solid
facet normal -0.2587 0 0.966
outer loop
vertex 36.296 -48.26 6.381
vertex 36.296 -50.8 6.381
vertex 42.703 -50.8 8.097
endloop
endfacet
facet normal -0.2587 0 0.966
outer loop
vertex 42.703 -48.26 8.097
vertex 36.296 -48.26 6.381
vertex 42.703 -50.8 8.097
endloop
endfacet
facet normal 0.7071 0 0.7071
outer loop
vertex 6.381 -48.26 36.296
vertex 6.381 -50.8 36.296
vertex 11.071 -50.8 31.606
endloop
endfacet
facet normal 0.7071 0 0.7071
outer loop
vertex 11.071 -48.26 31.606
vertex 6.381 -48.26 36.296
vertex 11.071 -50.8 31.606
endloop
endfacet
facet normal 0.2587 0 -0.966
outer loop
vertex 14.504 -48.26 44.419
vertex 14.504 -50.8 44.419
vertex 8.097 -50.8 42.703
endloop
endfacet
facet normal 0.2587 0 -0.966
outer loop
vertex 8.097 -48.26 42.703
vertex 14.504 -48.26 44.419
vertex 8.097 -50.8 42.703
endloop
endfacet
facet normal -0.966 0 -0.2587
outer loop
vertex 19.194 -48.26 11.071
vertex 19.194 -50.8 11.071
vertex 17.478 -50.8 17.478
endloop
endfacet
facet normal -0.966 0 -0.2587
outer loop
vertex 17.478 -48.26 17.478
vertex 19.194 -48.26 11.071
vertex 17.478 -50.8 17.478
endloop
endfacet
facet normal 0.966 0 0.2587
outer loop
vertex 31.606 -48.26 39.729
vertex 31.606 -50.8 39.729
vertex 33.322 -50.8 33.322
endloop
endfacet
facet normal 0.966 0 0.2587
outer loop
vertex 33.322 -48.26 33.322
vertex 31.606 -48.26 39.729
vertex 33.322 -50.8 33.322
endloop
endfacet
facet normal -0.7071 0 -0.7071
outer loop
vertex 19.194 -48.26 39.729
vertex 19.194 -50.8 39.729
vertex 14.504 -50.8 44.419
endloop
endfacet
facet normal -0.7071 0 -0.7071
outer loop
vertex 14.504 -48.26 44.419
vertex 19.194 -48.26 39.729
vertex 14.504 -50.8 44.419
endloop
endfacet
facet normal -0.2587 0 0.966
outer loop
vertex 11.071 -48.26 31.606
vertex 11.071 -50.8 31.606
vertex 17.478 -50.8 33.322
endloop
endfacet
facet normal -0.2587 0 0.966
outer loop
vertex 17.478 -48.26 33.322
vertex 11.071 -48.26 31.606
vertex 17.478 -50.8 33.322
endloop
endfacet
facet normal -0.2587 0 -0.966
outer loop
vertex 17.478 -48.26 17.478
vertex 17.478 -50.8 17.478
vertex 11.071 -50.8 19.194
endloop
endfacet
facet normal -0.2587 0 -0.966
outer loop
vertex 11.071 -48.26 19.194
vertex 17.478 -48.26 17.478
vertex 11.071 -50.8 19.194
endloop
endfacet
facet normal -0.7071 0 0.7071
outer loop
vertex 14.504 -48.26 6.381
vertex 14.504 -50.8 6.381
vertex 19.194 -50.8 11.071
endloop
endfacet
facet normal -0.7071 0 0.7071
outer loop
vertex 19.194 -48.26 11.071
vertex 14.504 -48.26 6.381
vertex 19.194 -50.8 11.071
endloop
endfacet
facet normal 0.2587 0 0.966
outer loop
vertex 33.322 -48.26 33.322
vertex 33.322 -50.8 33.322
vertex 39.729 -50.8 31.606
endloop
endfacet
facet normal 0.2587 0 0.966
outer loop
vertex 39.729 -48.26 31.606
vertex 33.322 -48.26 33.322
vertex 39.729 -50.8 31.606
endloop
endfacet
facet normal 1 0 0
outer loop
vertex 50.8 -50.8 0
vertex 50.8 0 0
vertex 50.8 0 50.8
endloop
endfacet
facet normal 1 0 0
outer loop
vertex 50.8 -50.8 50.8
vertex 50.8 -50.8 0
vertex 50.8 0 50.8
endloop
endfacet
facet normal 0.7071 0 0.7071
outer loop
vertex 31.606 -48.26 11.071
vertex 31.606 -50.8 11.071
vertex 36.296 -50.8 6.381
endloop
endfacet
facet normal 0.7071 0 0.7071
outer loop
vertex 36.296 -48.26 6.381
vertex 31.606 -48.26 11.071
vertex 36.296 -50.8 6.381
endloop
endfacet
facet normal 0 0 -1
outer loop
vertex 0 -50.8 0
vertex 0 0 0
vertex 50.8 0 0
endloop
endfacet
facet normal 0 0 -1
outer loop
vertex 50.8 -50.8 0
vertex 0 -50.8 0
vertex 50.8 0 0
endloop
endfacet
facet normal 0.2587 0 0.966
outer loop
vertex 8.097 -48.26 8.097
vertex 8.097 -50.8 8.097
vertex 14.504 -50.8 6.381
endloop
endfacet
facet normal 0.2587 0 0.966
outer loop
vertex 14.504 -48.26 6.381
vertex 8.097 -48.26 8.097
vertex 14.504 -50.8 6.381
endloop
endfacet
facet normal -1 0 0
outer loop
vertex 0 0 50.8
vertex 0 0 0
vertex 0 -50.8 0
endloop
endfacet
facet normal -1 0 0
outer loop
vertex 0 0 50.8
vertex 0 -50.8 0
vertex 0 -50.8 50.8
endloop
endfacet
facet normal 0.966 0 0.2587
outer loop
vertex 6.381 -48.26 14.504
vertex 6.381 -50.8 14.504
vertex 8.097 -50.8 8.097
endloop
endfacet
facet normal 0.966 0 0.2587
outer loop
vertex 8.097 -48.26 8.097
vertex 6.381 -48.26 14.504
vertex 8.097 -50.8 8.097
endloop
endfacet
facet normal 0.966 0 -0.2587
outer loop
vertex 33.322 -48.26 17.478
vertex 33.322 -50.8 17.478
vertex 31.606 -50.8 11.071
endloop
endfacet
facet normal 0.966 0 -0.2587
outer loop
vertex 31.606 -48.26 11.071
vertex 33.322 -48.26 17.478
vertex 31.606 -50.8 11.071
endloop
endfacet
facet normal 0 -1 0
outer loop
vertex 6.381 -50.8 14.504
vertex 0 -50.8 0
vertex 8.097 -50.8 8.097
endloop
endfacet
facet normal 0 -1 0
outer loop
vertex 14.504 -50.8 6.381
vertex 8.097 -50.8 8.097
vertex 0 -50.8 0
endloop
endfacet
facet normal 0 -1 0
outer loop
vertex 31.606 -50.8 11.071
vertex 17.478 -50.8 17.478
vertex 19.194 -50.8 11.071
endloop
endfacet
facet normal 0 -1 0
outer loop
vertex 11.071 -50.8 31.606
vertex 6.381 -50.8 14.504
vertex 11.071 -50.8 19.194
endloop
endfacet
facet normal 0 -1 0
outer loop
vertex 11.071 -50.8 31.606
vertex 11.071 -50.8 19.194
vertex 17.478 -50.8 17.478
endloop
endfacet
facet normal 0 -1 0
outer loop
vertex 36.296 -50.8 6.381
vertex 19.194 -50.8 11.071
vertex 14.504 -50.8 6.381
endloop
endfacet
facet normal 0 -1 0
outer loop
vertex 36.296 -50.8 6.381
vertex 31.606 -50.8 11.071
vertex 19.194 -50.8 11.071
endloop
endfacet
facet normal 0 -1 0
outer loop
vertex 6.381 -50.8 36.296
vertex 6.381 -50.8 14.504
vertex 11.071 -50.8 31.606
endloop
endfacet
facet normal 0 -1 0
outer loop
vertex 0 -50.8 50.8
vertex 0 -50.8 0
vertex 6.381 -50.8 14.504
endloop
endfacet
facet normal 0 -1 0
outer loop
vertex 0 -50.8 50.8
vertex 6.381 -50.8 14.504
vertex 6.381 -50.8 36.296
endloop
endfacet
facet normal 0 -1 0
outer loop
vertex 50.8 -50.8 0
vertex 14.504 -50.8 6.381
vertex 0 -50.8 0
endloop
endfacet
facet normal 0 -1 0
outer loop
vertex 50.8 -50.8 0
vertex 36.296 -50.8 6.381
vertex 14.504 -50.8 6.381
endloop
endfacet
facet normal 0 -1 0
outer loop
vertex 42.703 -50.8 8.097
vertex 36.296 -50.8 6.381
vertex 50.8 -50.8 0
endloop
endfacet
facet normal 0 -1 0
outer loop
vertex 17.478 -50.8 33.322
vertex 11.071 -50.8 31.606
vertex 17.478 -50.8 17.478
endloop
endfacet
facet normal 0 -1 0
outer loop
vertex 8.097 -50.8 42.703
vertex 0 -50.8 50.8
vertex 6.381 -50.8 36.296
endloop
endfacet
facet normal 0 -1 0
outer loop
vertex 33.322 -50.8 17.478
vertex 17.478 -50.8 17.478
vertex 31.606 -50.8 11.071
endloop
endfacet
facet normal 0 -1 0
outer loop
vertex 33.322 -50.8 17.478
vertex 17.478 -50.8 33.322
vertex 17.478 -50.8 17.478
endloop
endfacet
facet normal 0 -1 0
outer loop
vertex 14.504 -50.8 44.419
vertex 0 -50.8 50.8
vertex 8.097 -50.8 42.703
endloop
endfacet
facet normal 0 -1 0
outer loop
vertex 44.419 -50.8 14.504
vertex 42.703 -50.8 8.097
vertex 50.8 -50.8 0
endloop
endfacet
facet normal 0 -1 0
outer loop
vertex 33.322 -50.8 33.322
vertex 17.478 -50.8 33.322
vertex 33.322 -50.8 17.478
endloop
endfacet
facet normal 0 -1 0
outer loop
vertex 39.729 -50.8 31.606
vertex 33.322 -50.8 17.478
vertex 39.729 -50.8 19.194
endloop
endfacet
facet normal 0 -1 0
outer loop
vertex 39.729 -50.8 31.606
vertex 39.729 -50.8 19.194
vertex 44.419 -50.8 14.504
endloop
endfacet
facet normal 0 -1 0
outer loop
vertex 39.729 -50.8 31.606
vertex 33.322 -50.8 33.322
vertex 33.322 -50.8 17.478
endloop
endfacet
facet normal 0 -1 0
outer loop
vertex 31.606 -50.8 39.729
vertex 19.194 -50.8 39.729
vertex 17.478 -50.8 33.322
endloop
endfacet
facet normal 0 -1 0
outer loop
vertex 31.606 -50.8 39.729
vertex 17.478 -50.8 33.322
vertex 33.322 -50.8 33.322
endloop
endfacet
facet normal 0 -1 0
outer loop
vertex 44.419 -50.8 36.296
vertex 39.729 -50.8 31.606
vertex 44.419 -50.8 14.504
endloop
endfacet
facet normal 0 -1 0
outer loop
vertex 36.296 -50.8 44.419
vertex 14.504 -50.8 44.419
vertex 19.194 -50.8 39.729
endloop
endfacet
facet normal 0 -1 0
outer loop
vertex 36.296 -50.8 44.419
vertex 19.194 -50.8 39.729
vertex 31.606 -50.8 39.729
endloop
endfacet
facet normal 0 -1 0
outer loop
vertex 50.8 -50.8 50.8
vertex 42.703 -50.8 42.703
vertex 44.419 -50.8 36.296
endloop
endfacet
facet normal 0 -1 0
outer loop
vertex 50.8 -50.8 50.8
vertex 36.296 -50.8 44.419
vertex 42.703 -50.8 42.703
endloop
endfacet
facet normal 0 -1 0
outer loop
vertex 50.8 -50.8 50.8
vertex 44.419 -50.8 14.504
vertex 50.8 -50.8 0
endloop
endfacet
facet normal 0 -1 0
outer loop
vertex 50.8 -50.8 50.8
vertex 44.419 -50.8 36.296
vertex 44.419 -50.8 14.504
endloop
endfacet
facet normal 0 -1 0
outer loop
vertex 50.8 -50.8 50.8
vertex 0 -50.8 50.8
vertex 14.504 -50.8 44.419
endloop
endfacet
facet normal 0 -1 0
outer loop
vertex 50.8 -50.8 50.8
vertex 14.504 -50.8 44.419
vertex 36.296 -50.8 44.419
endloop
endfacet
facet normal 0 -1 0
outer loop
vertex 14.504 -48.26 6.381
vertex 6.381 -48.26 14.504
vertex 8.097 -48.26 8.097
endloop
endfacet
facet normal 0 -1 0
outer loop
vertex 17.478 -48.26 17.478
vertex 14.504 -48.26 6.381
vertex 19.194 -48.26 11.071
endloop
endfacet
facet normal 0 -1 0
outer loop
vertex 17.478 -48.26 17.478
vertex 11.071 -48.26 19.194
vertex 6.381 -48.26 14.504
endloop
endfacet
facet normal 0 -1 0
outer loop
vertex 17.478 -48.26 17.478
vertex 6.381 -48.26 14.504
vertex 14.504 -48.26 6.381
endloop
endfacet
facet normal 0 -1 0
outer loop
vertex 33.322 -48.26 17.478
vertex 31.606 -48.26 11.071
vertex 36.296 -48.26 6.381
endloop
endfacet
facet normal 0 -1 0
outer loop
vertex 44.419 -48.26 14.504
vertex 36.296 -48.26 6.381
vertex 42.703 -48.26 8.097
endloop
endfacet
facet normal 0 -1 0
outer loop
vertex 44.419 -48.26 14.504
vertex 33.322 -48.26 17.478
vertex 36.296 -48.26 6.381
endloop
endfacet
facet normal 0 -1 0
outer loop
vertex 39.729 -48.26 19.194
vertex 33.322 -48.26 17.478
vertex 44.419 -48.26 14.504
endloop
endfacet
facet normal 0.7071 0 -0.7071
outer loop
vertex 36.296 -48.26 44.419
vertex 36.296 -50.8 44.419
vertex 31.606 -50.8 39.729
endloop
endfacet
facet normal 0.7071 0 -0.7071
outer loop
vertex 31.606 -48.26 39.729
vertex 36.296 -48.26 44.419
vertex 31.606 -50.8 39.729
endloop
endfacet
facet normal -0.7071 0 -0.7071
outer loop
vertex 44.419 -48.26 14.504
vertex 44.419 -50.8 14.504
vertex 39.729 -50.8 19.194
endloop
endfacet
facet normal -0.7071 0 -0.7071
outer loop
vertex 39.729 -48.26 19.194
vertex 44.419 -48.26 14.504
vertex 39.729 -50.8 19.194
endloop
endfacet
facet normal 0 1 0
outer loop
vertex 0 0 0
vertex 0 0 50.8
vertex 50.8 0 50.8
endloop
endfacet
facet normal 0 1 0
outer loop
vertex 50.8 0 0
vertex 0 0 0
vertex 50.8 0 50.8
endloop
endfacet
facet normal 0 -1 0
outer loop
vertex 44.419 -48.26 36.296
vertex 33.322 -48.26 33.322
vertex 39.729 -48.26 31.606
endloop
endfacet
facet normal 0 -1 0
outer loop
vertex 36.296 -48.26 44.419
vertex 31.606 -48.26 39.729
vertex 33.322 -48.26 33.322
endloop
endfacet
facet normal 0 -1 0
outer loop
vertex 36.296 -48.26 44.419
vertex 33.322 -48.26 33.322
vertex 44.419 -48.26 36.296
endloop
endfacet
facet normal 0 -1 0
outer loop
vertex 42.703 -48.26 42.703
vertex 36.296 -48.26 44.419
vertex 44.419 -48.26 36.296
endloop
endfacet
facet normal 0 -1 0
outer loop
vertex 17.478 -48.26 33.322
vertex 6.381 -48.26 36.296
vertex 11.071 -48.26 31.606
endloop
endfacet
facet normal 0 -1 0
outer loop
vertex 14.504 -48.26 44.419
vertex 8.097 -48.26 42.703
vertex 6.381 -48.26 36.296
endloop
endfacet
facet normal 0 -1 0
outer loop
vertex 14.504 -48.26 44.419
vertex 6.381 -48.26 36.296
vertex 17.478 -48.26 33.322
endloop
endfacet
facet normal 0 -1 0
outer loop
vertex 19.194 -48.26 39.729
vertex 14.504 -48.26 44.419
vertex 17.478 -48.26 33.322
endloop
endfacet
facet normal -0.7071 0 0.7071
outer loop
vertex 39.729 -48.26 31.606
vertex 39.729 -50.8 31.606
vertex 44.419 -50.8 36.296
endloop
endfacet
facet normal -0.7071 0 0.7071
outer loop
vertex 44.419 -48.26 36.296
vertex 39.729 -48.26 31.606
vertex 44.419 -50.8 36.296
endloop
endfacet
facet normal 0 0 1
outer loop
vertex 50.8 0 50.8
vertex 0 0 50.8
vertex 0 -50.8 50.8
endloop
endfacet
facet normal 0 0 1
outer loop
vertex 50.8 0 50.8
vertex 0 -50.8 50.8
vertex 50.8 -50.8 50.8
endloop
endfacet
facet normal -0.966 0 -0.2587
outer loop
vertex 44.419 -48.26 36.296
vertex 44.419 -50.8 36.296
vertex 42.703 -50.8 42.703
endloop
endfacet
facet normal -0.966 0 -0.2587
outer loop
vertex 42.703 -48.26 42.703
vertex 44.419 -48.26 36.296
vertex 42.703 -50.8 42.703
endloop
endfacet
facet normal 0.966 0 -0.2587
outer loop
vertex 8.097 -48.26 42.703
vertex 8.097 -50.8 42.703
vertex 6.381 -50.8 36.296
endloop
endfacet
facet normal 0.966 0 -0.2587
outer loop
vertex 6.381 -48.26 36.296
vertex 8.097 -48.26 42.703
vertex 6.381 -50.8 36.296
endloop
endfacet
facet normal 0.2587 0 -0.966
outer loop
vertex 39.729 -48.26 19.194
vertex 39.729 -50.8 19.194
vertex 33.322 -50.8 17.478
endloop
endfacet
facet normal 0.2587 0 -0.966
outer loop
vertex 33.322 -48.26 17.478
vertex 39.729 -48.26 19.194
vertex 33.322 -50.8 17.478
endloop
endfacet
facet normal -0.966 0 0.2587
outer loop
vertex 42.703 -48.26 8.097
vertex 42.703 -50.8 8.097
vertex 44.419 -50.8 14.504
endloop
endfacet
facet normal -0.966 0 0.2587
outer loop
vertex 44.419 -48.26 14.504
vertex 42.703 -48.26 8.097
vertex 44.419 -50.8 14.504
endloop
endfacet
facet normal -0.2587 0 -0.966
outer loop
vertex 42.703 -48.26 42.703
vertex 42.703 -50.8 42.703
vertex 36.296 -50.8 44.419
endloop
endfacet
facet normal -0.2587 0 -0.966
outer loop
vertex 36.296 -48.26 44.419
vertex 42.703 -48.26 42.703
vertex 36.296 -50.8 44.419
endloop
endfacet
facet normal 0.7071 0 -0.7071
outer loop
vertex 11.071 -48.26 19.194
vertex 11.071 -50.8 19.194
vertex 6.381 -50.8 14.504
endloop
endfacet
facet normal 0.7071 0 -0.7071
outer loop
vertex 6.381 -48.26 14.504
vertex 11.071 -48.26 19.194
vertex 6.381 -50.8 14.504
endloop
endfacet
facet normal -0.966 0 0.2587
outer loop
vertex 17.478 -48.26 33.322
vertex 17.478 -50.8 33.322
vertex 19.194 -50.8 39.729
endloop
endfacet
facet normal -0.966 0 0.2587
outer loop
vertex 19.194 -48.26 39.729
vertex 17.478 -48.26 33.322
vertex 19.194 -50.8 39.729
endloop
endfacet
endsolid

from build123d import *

# Parameters (mm, degrees)
F0_W     = 50.8
F0_H     = 50.8
F1_DEPTH = 50.8
F3_DEPTH = 2.54


with BuildPart() as f1:
    # F0 (on Front) → F1 (new body)
    with BuildSketch(Plane.XZ):
        with Locations((25.4, 25.4)):
            Rectangle(F0_W, F0_H)
    extrude(amount=F1_DEPTH)

    # F2 (on face) → F3 (cut)
    with BuildSketch(Plane.XZ.offset(50.8)):
        Polygon((19.194489, 39.729136), (14.504312, 44.419312), (8.097411, 42.702589), (6.380688, 36.295688), (11.070864, 31.605511), (17.477765, 33.322235), align=None)
        Polygon((44.419312, 36.295688), (42.702589, 42.702589), (36.295688, 44.419312), (31.605511, 39.729136), (33.322235, 33.322235), (39.729136, 31.605511), align=None)
        Polygon((14.504312, 6.380688), (19.194489, 11.070864), (17.477765, 17.477765), (11.070864, 19.194489), (6.380688, 14.504312), (8.097411, 8.097411), align=None)
        Polygon((33.322235, 17.477765), (31.605511, 11.070864), (36.295688, 6.380688), (42.702589, 8.097411), (44.419312, 14.504312), (39.729136, 19.194489), align=None)
    extrude(amount=-F3_DEPTH, mode=Mode.SUBTRACT)


solid = f1.part
